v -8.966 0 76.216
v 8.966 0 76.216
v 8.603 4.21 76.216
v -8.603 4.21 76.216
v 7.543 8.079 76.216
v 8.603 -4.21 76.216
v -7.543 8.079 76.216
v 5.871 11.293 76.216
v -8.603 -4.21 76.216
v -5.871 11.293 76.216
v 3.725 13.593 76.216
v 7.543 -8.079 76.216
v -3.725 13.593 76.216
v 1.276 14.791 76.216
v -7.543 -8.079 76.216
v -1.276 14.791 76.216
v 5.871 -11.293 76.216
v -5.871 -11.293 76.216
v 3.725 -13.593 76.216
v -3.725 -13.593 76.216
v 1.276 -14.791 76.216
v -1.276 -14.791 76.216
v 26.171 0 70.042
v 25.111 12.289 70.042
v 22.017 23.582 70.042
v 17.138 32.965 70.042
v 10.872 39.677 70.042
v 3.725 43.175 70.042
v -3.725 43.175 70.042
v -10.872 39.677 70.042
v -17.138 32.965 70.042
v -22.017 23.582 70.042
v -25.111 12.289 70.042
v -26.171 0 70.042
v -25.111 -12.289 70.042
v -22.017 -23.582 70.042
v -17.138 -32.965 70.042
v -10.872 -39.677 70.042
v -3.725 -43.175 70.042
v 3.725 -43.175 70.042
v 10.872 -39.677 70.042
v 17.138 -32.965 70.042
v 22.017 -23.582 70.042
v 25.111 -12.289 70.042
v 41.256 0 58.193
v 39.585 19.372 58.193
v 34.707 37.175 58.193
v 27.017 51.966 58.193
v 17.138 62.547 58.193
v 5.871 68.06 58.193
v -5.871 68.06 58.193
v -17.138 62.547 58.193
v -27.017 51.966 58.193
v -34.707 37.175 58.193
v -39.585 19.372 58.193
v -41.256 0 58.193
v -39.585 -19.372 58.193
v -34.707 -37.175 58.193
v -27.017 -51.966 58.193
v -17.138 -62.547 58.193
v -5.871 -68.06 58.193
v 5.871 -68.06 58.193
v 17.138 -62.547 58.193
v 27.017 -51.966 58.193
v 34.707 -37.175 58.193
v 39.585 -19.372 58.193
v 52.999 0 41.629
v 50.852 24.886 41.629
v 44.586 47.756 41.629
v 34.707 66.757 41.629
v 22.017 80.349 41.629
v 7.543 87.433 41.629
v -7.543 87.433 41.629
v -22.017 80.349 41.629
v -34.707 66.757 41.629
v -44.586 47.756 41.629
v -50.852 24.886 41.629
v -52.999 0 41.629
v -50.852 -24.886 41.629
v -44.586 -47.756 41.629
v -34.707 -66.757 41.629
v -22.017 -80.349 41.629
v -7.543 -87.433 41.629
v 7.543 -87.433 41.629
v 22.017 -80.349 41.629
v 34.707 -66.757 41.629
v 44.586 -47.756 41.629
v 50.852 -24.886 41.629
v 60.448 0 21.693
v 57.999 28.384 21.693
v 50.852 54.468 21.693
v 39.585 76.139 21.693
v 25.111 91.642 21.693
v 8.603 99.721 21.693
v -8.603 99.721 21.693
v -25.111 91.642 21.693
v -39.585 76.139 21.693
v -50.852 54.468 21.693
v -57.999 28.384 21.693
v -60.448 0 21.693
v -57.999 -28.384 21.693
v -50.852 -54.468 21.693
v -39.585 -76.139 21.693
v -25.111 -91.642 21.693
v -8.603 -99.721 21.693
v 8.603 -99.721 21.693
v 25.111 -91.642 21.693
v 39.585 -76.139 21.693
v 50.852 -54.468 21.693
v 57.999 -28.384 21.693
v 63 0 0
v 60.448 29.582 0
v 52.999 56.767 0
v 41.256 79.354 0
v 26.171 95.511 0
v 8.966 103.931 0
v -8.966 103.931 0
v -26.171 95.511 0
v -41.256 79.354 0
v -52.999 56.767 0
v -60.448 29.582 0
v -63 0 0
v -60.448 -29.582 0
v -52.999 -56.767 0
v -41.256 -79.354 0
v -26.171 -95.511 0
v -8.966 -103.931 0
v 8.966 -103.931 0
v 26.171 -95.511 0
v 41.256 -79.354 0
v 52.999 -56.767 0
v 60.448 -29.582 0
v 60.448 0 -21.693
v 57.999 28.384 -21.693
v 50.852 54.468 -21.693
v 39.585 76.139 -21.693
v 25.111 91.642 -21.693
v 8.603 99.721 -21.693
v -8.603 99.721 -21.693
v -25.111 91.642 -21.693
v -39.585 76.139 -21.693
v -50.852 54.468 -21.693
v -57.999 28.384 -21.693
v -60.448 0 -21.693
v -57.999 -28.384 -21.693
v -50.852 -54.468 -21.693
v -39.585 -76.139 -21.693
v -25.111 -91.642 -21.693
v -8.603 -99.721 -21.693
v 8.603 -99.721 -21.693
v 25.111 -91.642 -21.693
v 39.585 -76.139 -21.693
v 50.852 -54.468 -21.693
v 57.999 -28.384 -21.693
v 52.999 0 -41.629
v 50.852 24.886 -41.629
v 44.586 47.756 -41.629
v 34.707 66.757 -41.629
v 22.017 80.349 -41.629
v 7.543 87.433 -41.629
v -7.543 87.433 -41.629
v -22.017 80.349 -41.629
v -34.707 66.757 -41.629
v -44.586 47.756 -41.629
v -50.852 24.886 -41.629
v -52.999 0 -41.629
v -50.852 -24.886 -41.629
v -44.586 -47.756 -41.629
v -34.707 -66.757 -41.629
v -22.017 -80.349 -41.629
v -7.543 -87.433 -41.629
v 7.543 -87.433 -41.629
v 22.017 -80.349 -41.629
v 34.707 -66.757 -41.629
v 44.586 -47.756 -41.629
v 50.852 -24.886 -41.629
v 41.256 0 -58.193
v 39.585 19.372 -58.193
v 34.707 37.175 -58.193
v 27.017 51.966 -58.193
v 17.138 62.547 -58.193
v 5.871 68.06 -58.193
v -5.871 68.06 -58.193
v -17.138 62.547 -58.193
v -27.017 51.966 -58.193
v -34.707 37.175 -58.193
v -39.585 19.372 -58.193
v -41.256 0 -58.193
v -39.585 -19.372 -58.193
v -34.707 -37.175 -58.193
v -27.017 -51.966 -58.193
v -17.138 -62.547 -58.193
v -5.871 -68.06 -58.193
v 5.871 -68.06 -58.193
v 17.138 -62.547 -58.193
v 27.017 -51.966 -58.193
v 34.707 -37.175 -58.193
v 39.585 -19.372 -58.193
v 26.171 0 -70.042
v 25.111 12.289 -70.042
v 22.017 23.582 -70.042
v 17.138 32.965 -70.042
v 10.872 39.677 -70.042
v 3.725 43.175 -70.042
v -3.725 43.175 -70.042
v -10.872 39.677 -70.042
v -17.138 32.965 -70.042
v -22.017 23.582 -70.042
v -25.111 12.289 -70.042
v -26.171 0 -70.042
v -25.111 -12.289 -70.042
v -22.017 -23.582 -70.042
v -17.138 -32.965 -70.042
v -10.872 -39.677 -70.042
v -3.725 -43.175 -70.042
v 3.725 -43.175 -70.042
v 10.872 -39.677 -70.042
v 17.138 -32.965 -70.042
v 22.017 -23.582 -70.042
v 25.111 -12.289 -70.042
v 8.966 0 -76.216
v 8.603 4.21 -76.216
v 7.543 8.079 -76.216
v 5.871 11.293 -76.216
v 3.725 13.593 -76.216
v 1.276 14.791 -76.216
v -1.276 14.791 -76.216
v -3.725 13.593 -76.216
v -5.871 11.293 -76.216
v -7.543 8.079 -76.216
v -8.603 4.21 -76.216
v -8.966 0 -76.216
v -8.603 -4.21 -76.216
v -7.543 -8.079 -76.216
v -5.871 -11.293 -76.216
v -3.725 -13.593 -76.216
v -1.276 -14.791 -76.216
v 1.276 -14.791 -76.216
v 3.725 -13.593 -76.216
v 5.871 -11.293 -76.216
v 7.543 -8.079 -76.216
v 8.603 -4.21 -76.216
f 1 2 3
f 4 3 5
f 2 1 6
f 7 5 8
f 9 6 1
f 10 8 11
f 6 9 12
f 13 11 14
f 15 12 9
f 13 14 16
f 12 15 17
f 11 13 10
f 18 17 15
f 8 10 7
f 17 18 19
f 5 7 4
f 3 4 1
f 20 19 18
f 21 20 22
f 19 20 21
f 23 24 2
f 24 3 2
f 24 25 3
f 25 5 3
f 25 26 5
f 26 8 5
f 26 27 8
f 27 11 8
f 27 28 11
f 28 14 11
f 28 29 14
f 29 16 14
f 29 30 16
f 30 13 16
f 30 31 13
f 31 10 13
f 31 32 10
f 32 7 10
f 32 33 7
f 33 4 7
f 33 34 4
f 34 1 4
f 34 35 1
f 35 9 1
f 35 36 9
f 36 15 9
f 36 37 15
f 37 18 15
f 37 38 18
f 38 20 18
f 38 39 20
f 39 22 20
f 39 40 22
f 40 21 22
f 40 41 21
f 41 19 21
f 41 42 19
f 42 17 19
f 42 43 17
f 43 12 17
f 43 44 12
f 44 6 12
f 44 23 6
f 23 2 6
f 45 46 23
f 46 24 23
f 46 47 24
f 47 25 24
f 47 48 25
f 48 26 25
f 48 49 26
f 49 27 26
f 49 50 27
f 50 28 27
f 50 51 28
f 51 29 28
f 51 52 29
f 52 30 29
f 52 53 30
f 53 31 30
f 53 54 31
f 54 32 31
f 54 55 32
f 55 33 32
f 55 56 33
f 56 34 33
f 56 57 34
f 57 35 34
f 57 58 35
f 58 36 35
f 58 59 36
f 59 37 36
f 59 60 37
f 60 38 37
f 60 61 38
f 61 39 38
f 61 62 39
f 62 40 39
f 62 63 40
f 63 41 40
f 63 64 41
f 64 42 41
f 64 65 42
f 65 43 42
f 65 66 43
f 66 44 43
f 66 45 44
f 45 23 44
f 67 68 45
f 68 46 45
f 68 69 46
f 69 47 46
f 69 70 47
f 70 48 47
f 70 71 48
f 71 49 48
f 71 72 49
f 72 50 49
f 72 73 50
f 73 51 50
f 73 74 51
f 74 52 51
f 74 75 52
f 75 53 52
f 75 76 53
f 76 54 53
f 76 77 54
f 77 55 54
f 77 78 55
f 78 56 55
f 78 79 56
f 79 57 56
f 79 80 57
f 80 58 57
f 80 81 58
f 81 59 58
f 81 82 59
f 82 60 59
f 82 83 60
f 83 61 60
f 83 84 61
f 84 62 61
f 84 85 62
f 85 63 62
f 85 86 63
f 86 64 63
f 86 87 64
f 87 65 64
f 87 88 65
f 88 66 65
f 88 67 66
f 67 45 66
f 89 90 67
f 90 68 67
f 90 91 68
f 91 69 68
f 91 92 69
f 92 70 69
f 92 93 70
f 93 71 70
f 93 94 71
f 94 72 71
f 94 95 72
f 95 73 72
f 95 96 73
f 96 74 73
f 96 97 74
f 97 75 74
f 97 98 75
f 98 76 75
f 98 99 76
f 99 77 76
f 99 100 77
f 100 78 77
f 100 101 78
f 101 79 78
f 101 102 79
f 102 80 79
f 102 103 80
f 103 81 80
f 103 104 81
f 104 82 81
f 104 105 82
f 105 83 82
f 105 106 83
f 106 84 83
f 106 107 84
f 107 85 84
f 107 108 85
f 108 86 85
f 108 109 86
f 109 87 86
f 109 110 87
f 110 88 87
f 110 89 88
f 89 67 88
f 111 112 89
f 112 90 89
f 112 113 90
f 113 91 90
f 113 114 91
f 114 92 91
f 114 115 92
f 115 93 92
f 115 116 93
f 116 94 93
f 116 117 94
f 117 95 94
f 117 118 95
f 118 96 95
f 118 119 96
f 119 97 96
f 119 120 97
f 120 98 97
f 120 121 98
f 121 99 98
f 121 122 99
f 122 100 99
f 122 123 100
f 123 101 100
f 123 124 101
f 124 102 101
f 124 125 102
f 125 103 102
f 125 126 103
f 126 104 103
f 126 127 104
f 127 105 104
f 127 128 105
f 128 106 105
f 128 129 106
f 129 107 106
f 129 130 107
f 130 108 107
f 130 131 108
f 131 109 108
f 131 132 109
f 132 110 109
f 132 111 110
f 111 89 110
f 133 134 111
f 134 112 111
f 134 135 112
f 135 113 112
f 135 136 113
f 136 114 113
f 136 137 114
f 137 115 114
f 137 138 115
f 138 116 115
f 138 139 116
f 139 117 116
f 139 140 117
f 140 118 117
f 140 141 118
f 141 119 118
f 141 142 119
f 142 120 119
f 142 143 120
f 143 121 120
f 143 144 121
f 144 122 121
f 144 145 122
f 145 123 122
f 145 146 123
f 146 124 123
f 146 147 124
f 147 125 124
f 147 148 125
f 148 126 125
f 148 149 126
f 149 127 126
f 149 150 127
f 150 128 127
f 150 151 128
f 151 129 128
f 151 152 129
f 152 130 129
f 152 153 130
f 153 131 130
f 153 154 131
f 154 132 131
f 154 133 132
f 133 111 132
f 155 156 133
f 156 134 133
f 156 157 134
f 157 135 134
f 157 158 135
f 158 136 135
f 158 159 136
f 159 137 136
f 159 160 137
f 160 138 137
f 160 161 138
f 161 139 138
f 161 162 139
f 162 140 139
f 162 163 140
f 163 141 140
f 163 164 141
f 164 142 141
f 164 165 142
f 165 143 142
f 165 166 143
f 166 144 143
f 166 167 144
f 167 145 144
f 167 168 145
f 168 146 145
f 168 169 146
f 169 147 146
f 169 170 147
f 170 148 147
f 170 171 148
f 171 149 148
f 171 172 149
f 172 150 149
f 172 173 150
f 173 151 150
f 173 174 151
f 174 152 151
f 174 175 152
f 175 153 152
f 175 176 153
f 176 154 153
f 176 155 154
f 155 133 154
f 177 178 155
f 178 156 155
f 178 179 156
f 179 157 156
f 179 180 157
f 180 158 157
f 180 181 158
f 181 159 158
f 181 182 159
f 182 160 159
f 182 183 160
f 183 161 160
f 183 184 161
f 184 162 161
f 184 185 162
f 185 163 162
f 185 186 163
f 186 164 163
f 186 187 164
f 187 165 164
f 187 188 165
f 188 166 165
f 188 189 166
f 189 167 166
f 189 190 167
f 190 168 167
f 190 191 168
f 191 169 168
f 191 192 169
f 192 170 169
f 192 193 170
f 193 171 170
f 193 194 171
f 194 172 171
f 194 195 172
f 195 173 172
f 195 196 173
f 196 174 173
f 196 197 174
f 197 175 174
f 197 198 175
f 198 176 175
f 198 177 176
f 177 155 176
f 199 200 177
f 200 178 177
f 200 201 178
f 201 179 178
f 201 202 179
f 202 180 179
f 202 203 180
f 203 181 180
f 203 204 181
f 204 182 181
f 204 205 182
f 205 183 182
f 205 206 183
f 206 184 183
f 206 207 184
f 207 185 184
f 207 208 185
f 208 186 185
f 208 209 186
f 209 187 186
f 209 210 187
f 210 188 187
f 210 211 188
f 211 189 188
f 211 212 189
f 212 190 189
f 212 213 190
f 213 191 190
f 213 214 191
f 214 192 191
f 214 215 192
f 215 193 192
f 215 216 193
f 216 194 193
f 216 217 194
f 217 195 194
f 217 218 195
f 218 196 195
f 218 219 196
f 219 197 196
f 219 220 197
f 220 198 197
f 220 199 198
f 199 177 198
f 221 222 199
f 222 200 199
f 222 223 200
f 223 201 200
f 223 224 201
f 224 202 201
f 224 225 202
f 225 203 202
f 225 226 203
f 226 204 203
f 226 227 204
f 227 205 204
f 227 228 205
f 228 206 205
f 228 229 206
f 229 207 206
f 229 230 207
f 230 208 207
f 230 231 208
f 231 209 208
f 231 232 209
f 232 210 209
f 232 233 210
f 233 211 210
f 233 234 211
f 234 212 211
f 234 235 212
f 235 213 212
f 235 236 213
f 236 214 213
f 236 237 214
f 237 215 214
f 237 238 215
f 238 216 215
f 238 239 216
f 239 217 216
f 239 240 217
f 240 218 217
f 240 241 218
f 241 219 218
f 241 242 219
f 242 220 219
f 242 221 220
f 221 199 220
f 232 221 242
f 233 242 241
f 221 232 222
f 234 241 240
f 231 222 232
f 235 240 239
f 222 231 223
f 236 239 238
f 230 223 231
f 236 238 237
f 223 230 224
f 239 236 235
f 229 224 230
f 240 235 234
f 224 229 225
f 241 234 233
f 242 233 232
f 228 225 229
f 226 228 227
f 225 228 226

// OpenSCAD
// Generated by SolidPython 1.0.1 on 2020-07-29 00:46:49


scale(v = [9, 15, 11]) {
	sphere(r = 7);
}
/***********************************************
*********      SolidPython code:      **********
************************************************
 
# import packages: SolidPython
from solid import *
from solid.utils import *
from itertools import chain, combinations, permutations


class Resize:

    def __init__(self, scad_file):
        self.scad_file = scad_file
        #self.scad_file = import_scad(scad_file)
        # cone/cylinder param:
        self.r1 = 0
        self.r2 = 0
        self.h = 0
        # rectangular prism param:
        self.w = 0
        self.l = 0
        # ellipse param:
        self.r = 0

    # import OpenScad code (file name corresponds to shape)


    # classify shape + parameters
    def assign(self, param1, param2, param3):
        if self.scad_file == 'cone.scad':
            self.r1 = param1
            self.r2 = param2
            self.h = param3
        elif self.scad_file == 'cylinder.scad':
            self.r1 = param1
            self.r2 = param2
            self.h = param3
        elif self.scad_file == 'rectangularPrism.scad':
            self.h = param1
            self.l = param2
            self.w = param3
        else:
            self.r = param1
            self.h = param2

    # resize parameters
    def iterate(self):
        x = range(3, 20, 2)
        i = 1
        if self.scad_file == 'cone.scad':
            tempList = list(permutations(x, 2))
            for temp in tempList:
                param1 = temp[0]
                param2 = temp[1]
                filepath = 'produced_scad_files/' + 'cone' + str(param1) + '_' + str(param2) + '_' + '.scad'
                scad_render_to_file(cylinder(h=param1, r1=param2, r2=0), filepath)

        elif self.scad_file == 'cylinder.scad':
            tempList = list(permutations(x, 3))
            for temp in tempList:
                param1 = temp[0]
                param2 = temp[1]
                filepath = 'produced_scad_files/' + 'cylinder' + str(param1) + '_' + str(param2) + '_' + '.scad'
                scad_render_to_file(cylinder(h=param1, r1=param2, r2=param2), filepath)

        elif self.scad_file == 'rectangularPrism.scad':
            tempList = list(permutations(x, 3))
            for temp in tempList:
                param1 = temp[0]
                param2 = temp[1]
                param3 = temp[2]
                filepath = 'produced_scad_files/' + 'rectangularPrism' + str(param1) + '_' + str(param2) + '_' + str(
                    param3) + '.scad'
                scad_render_to_file(cube(size=(param1, param2, param3)), filepath)

        elif self.scad_file == 'ellipse.scad':
            tempList = list(permutations(x, 4))
            for temp in tempList:
                param1 = temp[0]
                param2 = temp[1]
                param3 = temp[2]
                param4 = temp[3]
                filepath = 'produced_scad_files/' + 'ellipse' + str(param1) + '_' + str(param2) + '_' + str(param3) + '_' + str(param4) + '.scad'
                scad_render_to_file(scale([param1, param2, param3])(sphere(r=param4)), filepath)

    def render_to_scadfile(self):
        scad_render_to_file(scad, 'example.scad') 
 
************************************************/
